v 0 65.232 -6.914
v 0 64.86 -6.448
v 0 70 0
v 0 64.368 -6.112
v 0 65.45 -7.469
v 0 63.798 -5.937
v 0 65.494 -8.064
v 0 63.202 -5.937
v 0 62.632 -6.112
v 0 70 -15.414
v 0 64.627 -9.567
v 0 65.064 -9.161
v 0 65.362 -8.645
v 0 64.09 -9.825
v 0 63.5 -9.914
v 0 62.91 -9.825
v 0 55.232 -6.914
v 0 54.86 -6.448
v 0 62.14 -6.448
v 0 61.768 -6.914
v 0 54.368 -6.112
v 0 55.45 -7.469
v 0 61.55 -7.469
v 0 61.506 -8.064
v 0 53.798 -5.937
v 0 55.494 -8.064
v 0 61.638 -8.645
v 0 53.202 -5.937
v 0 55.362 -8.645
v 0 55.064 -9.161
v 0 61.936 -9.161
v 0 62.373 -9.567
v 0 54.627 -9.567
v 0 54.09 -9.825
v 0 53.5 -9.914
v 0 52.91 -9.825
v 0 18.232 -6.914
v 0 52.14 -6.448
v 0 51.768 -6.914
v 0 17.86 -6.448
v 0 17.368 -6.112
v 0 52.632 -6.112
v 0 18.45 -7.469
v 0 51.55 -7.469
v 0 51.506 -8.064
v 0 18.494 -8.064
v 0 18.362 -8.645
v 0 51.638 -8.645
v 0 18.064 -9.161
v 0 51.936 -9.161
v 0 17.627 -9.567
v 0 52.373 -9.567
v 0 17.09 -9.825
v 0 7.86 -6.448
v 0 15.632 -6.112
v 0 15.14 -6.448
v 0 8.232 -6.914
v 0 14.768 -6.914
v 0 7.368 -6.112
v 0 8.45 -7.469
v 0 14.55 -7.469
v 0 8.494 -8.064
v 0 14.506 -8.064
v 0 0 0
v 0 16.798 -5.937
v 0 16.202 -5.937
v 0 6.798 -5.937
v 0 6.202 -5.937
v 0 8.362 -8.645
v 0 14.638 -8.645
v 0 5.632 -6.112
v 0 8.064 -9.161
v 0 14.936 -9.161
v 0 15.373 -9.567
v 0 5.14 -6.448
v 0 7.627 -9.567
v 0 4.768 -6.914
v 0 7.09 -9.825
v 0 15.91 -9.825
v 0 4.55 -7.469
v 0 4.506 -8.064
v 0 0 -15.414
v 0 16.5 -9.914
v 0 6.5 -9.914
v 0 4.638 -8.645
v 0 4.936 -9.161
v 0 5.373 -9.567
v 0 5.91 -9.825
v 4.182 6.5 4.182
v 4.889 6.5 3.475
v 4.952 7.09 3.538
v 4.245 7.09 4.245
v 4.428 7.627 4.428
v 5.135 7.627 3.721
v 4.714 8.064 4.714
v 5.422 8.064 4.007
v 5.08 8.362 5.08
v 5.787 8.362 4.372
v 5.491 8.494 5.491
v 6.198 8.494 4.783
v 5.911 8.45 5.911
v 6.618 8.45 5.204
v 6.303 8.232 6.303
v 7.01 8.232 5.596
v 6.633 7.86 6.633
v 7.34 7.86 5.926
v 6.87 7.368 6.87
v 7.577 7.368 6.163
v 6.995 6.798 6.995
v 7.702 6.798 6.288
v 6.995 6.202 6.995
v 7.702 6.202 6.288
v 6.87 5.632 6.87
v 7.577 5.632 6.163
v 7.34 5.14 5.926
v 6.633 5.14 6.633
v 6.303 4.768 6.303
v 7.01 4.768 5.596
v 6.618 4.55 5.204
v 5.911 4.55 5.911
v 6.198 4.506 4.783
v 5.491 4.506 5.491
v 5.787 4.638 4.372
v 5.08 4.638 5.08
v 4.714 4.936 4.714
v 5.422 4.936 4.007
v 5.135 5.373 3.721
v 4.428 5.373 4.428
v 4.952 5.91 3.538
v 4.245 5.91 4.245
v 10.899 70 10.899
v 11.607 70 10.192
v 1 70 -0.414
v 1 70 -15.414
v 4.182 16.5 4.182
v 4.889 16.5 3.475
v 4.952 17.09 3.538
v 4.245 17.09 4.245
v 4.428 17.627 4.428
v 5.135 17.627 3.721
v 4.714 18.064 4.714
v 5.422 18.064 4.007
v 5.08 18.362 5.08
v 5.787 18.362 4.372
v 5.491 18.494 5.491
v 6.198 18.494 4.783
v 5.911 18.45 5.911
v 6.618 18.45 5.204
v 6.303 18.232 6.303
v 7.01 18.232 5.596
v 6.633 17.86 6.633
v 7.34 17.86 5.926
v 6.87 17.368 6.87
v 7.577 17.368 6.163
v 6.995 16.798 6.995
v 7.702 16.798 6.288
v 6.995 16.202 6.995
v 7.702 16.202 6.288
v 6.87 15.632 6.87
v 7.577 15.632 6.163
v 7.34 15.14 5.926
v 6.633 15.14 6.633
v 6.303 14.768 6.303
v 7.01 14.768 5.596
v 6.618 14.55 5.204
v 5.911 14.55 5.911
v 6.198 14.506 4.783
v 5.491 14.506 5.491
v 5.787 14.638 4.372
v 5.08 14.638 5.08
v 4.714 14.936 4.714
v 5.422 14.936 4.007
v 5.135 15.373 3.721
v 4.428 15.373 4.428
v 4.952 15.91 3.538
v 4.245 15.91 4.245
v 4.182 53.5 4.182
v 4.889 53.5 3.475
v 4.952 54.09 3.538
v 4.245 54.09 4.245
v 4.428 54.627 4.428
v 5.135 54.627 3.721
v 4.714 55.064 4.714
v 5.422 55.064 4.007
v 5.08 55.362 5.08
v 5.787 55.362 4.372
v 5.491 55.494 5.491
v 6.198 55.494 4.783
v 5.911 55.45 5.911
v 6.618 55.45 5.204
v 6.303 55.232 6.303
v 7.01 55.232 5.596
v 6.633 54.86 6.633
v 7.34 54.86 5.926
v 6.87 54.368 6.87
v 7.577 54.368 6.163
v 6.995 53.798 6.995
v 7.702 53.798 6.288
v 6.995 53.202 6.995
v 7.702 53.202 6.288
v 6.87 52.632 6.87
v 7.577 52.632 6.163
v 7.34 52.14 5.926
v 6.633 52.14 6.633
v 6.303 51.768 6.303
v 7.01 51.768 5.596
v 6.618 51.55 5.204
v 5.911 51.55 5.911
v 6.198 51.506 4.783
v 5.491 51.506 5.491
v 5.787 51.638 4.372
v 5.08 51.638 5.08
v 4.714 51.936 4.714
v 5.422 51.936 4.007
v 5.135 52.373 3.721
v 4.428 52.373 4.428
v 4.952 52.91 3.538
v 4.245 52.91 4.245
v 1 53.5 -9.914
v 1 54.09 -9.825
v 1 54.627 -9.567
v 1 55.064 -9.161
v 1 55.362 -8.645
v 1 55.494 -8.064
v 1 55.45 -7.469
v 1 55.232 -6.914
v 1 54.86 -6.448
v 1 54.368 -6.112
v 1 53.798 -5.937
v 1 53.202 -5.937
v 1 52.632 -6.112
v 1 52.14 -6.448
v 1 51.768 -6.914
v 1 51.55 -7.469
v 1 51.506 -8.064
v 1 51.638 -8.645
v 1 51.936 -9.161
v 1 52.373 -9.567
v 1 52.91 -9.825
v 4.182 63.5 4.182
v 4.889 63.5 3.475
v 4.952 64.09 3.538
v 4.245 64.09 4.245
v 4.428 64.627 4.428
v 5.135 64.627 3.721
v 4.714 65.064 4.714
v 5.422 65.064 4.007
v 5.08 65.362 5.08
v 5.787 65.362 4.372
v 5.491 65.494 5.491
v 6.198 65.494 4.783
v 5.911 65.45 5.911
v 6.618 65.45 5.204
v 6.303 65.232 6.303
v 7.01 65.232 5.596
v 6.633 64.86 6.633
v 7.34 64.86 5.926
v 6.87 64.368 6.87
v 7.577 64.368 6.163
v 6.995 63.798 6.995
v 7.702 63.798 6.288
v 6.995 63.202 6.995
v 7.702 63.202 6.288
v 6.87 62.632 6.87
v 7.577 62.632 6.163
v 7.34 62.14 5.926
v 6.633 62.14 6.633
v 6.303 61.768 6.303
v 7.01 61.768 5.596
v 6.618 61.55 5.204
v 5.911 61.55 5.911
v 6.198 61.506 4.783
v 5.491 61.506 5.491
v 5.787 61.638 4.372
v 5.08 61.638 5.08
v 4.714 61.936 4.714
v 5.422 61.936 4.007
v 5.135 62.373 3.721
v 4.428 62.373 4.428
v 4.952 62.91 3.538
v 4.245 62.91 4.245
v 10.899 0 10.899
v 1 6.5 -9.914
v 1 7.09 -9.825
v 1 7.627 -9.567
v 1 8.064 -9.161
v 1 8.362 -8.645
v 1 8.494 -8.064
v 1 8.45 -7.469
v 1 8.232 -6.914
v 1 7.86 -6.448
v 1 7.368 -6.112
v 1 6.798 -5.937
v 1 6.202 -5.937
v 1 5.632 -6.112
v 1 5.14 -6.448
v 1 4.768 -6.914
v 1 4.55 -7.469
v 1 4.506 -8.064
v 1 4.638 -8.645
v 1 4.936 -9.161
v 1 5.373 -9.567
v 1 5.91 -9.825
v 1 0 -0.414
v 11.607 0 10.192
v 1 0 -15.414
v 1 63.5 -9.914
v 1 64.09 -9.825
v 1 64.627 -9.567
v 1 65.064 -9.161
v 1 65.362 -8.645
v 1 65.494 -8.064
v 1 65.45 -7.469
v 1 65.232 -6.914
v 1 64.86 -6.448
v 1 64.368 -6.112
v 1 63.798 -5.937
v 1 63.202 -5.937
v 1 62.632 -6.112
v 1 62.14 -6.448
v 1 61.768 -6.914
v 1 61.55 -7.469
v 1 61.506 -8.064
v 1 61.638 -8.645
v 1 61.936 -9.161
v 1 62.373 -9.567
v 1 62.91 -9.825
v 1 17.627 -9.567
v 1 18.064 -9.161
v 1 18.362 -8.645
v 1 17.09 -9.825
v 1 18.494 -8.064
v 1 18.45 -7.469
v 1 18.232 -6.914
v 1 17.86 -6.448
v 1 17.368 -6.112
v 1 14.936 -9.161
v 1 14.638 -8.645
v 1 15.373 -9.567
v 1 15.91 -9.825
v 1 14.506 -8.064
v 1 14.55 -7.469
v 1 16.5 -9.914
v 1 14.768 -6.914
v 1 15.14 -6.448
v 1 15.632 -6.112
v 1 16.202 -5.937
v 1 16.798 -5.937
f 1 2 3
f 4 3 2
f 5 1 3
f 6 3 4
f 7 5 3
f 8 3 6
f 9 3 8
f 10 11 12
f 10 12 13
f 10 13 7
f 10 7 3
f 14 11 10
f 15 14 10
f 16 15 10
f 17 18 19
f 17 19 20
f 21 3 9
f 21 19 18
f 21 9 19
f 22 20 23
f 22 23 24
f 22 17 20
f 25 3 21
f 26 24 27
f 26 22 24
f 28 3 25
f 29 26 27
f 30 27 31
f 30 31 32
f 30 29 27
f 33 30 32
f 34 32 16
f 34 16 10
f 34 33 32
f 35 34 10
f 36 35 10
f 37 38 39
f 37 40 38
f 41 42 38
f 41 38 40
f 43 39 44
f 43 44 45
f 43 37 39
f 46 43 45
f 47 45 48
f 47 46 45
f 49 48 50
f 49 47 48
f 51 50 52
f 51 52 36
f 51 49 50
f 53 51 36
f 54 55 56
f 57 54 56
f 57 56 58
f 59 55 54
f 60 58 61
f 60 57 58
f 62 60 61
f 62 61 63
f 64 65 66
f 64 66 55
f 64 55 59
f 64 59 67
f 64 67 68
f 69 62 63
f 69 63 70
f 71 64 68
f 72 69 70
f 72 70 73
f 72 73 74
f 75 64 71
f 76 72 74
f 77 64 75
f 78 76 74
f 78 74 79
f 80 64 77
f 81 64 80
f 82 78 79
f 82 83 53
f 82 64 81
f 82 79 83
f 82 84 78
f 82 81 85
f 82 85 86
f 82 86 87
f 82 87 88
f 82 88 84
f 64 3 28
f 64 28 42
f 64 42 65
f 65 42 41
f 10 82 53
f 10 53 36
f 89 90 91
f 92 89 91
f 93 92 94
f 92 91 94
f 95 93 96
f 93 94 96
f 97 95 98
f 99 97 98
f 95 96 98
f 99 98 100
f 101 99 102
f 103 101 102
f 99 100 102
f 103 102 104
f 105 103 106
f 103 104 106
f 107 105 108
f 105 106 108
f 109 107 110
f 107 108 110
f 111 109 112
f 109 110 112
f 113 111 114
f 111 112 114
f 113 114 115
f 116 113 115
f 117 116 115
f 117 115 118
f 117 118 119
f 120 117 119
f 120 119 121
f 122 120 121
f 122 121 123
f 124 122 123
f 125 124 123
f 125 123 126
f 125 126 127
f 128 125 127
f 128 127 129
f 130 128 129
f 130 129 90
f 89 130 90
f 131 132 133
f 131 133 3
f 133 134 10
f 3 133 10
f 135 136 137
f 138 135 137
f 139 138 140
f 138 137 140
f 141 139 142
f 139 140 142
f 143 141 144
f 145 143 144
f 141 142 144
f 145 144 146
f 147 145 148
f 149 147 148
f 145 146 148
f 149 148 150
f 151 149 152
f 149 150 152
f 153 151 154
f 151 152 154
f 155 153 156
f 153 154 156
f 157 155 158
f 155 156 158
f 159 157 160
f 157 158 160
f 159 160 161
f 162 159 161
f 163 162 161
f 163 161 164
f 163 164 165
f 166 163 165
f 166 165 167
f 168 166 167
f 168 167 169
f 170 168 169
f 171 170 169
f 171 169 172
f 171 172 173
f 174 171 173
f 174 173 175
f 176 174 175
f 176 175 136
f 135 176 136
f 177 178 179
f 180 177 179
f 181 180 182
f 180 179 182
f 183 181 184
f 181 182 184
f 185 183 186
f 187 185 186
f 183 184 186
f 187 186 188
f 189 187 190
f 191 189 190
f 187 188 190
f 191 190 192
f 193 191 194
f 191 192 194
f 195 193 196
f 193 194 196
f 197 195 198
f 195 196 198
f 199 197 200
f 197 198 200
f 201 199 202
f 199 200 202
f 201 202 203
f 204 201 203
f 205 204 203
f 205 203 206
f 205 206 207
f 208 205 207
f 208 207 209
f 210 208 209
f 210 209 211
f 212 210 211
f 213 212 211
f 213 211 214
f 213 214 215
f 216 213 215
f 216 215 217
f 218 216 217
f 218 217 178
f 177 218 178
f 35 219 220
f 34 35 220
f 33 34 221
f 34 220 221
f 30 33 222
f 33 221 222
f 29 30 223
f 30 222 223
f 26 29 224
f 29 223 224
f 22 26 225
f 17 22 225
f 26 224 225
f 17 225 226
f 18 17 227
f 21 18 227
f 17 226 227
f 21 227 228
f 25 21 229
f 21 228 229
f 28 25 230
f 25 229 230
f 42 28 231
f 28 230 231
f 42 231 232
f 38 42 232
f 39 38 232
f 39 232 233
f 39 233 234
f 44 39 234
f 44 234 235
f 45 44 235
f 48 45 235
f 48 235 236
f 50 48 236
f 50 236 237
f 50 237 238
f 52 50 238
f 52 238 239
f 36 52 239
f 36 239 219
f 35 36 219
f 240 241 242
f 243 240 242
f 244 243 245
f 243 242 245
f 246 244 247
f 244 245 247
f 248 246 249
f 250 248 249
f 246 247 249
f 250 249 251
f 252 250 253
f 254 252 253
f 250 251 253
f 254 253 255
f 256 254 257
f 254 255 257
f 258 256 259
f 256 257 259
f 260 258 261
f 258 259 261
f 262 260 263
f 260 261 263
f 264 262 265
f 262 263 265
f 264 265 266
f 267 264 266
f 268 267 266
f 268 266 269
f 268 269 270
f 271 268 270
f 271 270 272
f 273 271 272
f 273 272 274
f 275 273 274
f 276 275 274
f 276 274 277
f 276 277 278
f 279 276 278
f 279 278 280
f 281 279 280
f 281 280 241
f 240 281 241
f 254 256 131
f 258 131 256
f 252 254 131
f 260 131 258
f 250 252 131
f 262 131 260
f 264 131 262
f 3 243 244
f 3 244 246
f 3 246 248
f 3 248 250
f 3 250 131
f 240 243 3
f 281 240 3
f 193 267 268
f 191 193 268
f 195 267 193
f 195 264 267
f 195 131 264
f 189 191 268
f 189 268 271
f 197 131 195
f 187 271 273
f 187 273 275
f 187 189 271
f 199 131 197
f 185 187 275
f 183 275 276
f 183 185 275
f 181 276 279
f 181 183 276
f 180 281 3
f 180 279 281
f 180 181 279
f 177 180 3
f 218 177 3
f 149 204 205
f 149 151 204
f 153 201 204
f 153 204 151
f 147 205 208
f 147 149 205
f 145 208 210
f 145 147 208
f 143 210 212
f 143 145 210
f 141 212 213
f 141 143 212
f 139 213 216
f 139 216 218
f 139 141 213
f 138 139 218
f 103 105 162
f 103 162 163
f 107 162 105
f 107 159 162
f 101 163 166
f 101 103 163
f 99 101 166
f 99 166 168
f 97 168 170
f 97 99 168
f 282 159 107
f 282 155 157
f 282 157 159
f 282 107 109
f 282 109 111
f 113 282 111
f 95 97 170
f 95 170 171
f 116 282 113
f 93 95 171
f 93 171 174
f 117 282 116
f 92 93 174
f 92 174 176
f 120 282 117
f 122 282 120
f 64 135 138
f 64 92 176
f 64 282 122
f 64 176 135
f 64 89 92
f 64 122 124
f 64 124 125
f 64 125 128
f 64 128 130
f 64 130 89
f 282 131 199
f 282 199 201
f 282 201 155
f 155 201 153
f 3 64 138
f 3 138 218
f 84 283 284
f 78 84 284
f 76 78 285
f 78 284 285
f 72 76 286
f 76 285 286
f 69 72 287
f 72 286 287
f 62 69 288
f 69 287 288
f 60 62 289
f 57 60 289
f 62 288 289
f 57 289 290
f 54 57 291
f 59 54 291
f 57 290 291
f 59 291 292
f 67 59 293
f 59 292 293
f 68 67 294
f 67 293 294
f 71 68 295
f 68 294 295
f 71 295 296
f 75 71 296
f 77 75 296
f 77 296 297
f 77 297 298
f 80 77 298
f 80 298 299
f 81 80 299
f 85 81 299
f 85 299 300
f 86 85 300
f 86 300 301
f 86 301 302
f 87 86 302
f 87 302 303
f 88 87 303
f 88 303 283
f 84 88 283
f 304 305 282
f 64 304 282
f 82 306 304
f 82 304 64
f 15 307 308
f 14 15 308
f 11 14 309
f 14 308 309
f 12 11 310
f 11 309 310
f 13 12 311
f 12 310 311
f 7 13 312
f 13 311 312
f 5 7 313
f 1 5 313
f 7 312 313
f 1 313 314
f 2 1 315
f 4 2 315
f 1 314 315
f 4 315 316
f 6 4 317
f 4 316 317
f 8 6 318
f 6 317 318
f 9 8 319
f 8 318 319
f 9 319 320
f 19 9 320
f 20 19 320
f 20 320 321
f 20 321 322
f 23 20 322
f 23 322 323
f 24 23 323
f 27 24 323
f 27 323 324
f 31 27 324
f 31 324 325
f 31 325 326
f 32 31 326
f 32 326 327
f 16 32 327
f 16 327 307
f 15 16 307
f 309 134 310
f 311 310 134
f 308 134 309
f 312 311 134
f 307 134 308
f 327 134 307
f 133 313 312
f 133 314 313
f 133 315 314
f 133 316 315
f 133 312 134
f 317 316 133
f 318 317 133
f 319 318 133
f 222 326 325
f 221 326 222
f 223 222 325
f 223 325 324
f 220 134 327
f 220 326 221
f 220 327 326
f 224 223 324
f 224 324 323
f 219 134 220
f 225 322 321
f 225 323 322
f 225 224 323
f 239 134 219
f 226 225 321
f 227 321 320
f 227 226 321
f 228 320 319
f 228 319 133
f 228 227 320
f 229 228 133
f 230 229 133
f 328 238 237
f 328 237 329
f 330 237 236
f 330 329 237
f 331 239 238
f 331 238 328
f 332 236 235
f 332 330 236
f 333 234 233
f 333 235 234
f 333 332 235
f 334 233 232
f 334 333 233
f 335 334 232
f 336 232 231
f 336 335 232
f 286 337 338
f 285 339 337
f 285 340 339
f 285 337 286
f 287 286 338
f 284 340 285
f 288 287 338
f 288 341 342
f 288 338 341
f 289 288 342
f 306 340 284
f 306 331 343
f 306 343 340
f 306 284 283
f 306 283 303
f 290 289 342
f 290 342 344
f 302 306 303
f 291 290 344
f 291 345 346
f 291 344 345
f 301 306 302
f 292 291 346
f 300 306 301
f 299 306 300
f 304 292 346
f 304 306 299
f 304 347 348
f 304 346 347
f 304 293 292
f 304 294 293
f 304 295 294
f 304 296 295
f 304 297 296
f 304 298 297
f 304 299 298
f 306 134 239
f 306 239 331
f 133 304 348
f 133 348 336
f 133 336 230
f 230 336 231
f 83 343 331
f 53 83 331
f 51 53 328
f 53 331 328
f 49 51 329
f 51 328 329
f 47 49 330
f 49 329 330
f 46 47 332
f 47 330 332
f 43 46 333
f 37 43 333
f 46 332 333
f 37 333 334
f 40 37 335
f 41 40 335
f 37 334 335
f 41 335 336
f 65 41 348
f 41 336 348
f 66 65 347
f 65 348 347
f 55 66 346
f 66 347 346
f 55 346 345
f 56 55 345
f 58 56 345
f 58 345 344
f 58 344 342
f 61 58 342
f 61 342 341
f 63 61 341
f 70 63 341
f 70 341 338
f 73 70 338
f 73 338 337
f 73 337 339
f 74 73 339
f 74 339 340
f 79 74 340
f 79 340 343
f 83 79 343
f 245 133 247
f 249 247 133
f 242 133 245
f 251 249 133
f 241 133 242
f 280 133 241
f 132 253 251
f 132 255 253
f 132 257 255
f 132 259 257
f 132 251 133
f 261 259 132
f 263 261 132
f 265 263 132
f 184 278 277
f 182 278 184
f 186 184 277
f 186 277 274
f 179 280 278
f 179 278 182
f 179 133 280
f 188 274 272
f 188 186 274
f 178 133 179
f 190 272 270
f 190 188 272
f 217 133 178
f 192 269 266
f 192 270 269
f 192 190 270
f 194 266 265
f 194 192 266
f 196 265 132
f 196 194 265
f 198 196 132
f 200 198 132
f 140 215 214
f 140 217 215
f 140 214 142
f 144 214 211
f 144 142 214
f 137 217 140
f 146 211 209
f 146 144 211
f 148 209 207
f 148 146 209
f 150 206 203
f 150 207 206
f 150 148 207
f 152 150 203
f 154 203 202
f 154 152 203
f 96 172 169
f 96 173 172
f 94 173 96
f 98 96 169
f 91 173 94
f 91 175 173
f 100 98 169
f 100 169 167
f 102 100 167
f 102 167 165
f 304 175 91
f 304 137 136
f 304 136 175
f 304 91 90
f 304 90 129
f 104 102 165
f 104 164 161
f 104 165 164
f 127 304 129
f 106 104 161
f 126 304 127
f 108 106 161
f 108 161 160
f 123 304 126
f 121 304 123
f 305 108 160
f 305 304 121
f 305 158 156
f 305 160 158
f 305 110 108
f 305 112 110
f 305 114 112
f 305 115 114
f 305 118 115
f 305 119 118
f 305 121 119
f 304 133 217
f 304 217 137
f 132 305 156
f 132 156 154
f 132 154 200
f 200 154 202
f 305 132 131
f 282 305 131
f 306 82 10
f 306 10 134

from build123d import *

# Parameters (mm, degrees)
EXTRUSION1_DEPTH = 70
EXTRUSION2_REACH = 3
ESQUISSE2_R      = 2
EXTRUSION3_REACH = 10.707
ESQUISSE3_R      = 2


with BuildPart() as part:
    # Esquisse1 → Extrusion1 (new body)
    with BuildSketch(Plane(origin=(0, 0, 0), x_dir=(1, 0, 0), z_dir=(0, 1, 0))):
        Polygon((0, 0), (0, 15.414213562), (1, 15.414213562), (1, 0.414213562), (11.606601718, -10.192388155), (10.899494937, -10.899494937), align=None)
    extrude(amount=EXTRUSION1_DEPTH)

    # Esquisse2 → Extrusion2 (cut, up to next)
    with BuildSketch(Plane(origin=(1, 0, 0), x_dir=(0, 0, -1), z_dir=(1, 0, 0)), mode=Mode.PRIVATE) as extrusion2_sk1:
        with Locations((7.914213562, 16.5)):
            Circle(ESQUISSE2_R)
    extrusion2_tool1 = extrude(extrusion2_sk1.sketch, amount=-EXTRUSION2_REACH, mode=Mode.PRIVATE) & part.part
    add(extrusion2_tool1.solids().sort_by_distance((1, 16.5, -7.914214))[0], mode=Mode.SUBTRACT)
    # Esquisse2 → Extrusion2 (cut, up to next)
    with BuildSketch(Plane(origin=(1, 0, 0), x_dir=(0, 0, -1), z_dir=(1, 0, 0)), mode=Mode.PRIVATE) as extrusion2_sk2:
        with Locations((7.914213562, 6.5)):
            Circle(ESQUISSE2_R)
    extrusion2_tool2 = extrude(extrusion2_sk2.sketch, amount=-EXTRUSION2_REACH, mode=Mode.PRIVATE) & part.part
    add(extrusion2_tool2.solids().sort_by_distance((1, 6.5, -7.914214))[0], mode=Mode.SUBTRACT)
    # Esquisse2 → Extrusion2 (cut, up to next)
    with BuildSketch(Plane(origin=(1, 0, 0), x_dir=(0, 0, -1), z_dir=(1, 0, 0)), mode=Mode.PRIVATE) as extrusion2_sk3:
        with Locations((7.914213562, 53.5)):
            Circle(ESQUISSE2_R)
    extrusion2_tool3 = extrude(extrusion2_sk3.sketch, amount=-EXTRUSION2_REACH, mode=Mode.PRIVATE) & part.part
    add(extrusion2_tool3.solids().sort_by_distance((1, 53.5, -7.914214))[0], mode=Mode.SUBTRACT)
    # Esquisse2 → Extrusion2 (cut, up to next)
    with BuildSketch(Plane(origin=(1, 0, 0), x_dir=(0, 0, -1), z_dir=(1, 0, 0)), mode=Mode.PRIVATE) as extrusion2_sk4:
        with Locations((7.914213562, 63.5)):
            Circle(ESQUISSE2_R)
    extrusion2_tool4 = extrude(extrusion2_sk4.sketch, amount=-EXTRUSION2_REACH, mode=Mode.PRIVATE) & part.part
    add(extrusion2_tool4.solids().sort_by_distance((1, 63.5, -7.914214))[0], mode=Mode.SUBTRACT)

    # Esquisse3 → Extrusion3 (cut, up to next)
    with BuildSketch(Plane(origin=(0.707106781, 0, -0.707106781), x_dir=(-0.707106781, 0, -0.707106781), z_dir=(0.707106781, 0, -0.707106781)), mode=Mode.PRIVATE) as extrusion3_sk1:
        with Locations((-7.914213562, 53.5)):
            Circle(ESQUISSE3_R)
    extrusion3_tool1 = extrude(extrusion3_sk1.sketch, amount=-EXTRUSION3_REACH, mode=Mode.PRIVATE) & part.part
    add(extrusion3_tool1.solids().sort_by_distance((6.303301, 53.5, 4.889087))[0], mode=Mode.SUBTRACT)
    # Esquisse3 → Extrusion3 (cut, up to next)
    with BuildSketch(Plane(origin=(0.707106781, 0, -0.707106781), x_dir=(-0.707106781, 0, -0.707106781), z_dir=(0.707106781, 0, -0.707106781)), mode=Mode.PRIVATE) as extrusion3_sk2:
        with Locations((-7.914213562, 63.5)):
            Circle(ESQUISSE3_R)
    extrusion3_tool2 = extrude(extrusion3_sk2.sketch, amount=-EXTRUSION3_REACH, mode=Mode.PRIVATE) & part.part
    add(extrusion3_tool2.solids().sort_by_distance((6.303301, 63.5, 4.889087))[0], mode=Mode.SUBTRACT)
    # Esquisse3 → Extrusion3 (cut, up to next)
    with BuildSketch(Plane(origin=(0.707106781, 0, -0.707106781), x_dir=(-0.707106781, 0, -0.707106781), z_dir=(0.707106781, 0, -0.707106781)), mode=Mode.PRIVATE) as extrusion3_sk3:
        with Locations((-7.914213562, 6.5)):
            Circle(ESQUISSE3_R)
    extrusion3_tool3 = extrude(extrusion3_sk3.sketch, amount=-EXTRUSION3_REACH, mode=Mode.PRIVATE) & part.part
    add(extrusion3_tool3.solids().sort_by_distance((6.303301, 6.5, 4.889087))[0], mode=Mode.SUBTRACT)
    # Esquisse3 → Extrusion3 (cut, up to next)
    with BuildSketch(Plane(origin=(0.707106781, 0, -0.707106781), x_dir=(-0.707106781, 0, -0.707106781), z_dir=(0.707106781, 0, -0.707106781)), mode=Mode.PRIVATE) as extrusion3_sk4:
        with Locations((-7.914213562, 16.5)):
            Circle(ESQUISSE3_R)
    extrusion3_tool4 = extrude(extrusion3_sk4.sketch, amount=-EXTRUSION3_REACH, mode=Mode.PRIVATE) & part.part
    add(extrusion3_tool4.solids().sort_by_distance((6.303301, 16.5, 4.889087))[0], mode=Mode.SUBTRACT)


solid = part.part
